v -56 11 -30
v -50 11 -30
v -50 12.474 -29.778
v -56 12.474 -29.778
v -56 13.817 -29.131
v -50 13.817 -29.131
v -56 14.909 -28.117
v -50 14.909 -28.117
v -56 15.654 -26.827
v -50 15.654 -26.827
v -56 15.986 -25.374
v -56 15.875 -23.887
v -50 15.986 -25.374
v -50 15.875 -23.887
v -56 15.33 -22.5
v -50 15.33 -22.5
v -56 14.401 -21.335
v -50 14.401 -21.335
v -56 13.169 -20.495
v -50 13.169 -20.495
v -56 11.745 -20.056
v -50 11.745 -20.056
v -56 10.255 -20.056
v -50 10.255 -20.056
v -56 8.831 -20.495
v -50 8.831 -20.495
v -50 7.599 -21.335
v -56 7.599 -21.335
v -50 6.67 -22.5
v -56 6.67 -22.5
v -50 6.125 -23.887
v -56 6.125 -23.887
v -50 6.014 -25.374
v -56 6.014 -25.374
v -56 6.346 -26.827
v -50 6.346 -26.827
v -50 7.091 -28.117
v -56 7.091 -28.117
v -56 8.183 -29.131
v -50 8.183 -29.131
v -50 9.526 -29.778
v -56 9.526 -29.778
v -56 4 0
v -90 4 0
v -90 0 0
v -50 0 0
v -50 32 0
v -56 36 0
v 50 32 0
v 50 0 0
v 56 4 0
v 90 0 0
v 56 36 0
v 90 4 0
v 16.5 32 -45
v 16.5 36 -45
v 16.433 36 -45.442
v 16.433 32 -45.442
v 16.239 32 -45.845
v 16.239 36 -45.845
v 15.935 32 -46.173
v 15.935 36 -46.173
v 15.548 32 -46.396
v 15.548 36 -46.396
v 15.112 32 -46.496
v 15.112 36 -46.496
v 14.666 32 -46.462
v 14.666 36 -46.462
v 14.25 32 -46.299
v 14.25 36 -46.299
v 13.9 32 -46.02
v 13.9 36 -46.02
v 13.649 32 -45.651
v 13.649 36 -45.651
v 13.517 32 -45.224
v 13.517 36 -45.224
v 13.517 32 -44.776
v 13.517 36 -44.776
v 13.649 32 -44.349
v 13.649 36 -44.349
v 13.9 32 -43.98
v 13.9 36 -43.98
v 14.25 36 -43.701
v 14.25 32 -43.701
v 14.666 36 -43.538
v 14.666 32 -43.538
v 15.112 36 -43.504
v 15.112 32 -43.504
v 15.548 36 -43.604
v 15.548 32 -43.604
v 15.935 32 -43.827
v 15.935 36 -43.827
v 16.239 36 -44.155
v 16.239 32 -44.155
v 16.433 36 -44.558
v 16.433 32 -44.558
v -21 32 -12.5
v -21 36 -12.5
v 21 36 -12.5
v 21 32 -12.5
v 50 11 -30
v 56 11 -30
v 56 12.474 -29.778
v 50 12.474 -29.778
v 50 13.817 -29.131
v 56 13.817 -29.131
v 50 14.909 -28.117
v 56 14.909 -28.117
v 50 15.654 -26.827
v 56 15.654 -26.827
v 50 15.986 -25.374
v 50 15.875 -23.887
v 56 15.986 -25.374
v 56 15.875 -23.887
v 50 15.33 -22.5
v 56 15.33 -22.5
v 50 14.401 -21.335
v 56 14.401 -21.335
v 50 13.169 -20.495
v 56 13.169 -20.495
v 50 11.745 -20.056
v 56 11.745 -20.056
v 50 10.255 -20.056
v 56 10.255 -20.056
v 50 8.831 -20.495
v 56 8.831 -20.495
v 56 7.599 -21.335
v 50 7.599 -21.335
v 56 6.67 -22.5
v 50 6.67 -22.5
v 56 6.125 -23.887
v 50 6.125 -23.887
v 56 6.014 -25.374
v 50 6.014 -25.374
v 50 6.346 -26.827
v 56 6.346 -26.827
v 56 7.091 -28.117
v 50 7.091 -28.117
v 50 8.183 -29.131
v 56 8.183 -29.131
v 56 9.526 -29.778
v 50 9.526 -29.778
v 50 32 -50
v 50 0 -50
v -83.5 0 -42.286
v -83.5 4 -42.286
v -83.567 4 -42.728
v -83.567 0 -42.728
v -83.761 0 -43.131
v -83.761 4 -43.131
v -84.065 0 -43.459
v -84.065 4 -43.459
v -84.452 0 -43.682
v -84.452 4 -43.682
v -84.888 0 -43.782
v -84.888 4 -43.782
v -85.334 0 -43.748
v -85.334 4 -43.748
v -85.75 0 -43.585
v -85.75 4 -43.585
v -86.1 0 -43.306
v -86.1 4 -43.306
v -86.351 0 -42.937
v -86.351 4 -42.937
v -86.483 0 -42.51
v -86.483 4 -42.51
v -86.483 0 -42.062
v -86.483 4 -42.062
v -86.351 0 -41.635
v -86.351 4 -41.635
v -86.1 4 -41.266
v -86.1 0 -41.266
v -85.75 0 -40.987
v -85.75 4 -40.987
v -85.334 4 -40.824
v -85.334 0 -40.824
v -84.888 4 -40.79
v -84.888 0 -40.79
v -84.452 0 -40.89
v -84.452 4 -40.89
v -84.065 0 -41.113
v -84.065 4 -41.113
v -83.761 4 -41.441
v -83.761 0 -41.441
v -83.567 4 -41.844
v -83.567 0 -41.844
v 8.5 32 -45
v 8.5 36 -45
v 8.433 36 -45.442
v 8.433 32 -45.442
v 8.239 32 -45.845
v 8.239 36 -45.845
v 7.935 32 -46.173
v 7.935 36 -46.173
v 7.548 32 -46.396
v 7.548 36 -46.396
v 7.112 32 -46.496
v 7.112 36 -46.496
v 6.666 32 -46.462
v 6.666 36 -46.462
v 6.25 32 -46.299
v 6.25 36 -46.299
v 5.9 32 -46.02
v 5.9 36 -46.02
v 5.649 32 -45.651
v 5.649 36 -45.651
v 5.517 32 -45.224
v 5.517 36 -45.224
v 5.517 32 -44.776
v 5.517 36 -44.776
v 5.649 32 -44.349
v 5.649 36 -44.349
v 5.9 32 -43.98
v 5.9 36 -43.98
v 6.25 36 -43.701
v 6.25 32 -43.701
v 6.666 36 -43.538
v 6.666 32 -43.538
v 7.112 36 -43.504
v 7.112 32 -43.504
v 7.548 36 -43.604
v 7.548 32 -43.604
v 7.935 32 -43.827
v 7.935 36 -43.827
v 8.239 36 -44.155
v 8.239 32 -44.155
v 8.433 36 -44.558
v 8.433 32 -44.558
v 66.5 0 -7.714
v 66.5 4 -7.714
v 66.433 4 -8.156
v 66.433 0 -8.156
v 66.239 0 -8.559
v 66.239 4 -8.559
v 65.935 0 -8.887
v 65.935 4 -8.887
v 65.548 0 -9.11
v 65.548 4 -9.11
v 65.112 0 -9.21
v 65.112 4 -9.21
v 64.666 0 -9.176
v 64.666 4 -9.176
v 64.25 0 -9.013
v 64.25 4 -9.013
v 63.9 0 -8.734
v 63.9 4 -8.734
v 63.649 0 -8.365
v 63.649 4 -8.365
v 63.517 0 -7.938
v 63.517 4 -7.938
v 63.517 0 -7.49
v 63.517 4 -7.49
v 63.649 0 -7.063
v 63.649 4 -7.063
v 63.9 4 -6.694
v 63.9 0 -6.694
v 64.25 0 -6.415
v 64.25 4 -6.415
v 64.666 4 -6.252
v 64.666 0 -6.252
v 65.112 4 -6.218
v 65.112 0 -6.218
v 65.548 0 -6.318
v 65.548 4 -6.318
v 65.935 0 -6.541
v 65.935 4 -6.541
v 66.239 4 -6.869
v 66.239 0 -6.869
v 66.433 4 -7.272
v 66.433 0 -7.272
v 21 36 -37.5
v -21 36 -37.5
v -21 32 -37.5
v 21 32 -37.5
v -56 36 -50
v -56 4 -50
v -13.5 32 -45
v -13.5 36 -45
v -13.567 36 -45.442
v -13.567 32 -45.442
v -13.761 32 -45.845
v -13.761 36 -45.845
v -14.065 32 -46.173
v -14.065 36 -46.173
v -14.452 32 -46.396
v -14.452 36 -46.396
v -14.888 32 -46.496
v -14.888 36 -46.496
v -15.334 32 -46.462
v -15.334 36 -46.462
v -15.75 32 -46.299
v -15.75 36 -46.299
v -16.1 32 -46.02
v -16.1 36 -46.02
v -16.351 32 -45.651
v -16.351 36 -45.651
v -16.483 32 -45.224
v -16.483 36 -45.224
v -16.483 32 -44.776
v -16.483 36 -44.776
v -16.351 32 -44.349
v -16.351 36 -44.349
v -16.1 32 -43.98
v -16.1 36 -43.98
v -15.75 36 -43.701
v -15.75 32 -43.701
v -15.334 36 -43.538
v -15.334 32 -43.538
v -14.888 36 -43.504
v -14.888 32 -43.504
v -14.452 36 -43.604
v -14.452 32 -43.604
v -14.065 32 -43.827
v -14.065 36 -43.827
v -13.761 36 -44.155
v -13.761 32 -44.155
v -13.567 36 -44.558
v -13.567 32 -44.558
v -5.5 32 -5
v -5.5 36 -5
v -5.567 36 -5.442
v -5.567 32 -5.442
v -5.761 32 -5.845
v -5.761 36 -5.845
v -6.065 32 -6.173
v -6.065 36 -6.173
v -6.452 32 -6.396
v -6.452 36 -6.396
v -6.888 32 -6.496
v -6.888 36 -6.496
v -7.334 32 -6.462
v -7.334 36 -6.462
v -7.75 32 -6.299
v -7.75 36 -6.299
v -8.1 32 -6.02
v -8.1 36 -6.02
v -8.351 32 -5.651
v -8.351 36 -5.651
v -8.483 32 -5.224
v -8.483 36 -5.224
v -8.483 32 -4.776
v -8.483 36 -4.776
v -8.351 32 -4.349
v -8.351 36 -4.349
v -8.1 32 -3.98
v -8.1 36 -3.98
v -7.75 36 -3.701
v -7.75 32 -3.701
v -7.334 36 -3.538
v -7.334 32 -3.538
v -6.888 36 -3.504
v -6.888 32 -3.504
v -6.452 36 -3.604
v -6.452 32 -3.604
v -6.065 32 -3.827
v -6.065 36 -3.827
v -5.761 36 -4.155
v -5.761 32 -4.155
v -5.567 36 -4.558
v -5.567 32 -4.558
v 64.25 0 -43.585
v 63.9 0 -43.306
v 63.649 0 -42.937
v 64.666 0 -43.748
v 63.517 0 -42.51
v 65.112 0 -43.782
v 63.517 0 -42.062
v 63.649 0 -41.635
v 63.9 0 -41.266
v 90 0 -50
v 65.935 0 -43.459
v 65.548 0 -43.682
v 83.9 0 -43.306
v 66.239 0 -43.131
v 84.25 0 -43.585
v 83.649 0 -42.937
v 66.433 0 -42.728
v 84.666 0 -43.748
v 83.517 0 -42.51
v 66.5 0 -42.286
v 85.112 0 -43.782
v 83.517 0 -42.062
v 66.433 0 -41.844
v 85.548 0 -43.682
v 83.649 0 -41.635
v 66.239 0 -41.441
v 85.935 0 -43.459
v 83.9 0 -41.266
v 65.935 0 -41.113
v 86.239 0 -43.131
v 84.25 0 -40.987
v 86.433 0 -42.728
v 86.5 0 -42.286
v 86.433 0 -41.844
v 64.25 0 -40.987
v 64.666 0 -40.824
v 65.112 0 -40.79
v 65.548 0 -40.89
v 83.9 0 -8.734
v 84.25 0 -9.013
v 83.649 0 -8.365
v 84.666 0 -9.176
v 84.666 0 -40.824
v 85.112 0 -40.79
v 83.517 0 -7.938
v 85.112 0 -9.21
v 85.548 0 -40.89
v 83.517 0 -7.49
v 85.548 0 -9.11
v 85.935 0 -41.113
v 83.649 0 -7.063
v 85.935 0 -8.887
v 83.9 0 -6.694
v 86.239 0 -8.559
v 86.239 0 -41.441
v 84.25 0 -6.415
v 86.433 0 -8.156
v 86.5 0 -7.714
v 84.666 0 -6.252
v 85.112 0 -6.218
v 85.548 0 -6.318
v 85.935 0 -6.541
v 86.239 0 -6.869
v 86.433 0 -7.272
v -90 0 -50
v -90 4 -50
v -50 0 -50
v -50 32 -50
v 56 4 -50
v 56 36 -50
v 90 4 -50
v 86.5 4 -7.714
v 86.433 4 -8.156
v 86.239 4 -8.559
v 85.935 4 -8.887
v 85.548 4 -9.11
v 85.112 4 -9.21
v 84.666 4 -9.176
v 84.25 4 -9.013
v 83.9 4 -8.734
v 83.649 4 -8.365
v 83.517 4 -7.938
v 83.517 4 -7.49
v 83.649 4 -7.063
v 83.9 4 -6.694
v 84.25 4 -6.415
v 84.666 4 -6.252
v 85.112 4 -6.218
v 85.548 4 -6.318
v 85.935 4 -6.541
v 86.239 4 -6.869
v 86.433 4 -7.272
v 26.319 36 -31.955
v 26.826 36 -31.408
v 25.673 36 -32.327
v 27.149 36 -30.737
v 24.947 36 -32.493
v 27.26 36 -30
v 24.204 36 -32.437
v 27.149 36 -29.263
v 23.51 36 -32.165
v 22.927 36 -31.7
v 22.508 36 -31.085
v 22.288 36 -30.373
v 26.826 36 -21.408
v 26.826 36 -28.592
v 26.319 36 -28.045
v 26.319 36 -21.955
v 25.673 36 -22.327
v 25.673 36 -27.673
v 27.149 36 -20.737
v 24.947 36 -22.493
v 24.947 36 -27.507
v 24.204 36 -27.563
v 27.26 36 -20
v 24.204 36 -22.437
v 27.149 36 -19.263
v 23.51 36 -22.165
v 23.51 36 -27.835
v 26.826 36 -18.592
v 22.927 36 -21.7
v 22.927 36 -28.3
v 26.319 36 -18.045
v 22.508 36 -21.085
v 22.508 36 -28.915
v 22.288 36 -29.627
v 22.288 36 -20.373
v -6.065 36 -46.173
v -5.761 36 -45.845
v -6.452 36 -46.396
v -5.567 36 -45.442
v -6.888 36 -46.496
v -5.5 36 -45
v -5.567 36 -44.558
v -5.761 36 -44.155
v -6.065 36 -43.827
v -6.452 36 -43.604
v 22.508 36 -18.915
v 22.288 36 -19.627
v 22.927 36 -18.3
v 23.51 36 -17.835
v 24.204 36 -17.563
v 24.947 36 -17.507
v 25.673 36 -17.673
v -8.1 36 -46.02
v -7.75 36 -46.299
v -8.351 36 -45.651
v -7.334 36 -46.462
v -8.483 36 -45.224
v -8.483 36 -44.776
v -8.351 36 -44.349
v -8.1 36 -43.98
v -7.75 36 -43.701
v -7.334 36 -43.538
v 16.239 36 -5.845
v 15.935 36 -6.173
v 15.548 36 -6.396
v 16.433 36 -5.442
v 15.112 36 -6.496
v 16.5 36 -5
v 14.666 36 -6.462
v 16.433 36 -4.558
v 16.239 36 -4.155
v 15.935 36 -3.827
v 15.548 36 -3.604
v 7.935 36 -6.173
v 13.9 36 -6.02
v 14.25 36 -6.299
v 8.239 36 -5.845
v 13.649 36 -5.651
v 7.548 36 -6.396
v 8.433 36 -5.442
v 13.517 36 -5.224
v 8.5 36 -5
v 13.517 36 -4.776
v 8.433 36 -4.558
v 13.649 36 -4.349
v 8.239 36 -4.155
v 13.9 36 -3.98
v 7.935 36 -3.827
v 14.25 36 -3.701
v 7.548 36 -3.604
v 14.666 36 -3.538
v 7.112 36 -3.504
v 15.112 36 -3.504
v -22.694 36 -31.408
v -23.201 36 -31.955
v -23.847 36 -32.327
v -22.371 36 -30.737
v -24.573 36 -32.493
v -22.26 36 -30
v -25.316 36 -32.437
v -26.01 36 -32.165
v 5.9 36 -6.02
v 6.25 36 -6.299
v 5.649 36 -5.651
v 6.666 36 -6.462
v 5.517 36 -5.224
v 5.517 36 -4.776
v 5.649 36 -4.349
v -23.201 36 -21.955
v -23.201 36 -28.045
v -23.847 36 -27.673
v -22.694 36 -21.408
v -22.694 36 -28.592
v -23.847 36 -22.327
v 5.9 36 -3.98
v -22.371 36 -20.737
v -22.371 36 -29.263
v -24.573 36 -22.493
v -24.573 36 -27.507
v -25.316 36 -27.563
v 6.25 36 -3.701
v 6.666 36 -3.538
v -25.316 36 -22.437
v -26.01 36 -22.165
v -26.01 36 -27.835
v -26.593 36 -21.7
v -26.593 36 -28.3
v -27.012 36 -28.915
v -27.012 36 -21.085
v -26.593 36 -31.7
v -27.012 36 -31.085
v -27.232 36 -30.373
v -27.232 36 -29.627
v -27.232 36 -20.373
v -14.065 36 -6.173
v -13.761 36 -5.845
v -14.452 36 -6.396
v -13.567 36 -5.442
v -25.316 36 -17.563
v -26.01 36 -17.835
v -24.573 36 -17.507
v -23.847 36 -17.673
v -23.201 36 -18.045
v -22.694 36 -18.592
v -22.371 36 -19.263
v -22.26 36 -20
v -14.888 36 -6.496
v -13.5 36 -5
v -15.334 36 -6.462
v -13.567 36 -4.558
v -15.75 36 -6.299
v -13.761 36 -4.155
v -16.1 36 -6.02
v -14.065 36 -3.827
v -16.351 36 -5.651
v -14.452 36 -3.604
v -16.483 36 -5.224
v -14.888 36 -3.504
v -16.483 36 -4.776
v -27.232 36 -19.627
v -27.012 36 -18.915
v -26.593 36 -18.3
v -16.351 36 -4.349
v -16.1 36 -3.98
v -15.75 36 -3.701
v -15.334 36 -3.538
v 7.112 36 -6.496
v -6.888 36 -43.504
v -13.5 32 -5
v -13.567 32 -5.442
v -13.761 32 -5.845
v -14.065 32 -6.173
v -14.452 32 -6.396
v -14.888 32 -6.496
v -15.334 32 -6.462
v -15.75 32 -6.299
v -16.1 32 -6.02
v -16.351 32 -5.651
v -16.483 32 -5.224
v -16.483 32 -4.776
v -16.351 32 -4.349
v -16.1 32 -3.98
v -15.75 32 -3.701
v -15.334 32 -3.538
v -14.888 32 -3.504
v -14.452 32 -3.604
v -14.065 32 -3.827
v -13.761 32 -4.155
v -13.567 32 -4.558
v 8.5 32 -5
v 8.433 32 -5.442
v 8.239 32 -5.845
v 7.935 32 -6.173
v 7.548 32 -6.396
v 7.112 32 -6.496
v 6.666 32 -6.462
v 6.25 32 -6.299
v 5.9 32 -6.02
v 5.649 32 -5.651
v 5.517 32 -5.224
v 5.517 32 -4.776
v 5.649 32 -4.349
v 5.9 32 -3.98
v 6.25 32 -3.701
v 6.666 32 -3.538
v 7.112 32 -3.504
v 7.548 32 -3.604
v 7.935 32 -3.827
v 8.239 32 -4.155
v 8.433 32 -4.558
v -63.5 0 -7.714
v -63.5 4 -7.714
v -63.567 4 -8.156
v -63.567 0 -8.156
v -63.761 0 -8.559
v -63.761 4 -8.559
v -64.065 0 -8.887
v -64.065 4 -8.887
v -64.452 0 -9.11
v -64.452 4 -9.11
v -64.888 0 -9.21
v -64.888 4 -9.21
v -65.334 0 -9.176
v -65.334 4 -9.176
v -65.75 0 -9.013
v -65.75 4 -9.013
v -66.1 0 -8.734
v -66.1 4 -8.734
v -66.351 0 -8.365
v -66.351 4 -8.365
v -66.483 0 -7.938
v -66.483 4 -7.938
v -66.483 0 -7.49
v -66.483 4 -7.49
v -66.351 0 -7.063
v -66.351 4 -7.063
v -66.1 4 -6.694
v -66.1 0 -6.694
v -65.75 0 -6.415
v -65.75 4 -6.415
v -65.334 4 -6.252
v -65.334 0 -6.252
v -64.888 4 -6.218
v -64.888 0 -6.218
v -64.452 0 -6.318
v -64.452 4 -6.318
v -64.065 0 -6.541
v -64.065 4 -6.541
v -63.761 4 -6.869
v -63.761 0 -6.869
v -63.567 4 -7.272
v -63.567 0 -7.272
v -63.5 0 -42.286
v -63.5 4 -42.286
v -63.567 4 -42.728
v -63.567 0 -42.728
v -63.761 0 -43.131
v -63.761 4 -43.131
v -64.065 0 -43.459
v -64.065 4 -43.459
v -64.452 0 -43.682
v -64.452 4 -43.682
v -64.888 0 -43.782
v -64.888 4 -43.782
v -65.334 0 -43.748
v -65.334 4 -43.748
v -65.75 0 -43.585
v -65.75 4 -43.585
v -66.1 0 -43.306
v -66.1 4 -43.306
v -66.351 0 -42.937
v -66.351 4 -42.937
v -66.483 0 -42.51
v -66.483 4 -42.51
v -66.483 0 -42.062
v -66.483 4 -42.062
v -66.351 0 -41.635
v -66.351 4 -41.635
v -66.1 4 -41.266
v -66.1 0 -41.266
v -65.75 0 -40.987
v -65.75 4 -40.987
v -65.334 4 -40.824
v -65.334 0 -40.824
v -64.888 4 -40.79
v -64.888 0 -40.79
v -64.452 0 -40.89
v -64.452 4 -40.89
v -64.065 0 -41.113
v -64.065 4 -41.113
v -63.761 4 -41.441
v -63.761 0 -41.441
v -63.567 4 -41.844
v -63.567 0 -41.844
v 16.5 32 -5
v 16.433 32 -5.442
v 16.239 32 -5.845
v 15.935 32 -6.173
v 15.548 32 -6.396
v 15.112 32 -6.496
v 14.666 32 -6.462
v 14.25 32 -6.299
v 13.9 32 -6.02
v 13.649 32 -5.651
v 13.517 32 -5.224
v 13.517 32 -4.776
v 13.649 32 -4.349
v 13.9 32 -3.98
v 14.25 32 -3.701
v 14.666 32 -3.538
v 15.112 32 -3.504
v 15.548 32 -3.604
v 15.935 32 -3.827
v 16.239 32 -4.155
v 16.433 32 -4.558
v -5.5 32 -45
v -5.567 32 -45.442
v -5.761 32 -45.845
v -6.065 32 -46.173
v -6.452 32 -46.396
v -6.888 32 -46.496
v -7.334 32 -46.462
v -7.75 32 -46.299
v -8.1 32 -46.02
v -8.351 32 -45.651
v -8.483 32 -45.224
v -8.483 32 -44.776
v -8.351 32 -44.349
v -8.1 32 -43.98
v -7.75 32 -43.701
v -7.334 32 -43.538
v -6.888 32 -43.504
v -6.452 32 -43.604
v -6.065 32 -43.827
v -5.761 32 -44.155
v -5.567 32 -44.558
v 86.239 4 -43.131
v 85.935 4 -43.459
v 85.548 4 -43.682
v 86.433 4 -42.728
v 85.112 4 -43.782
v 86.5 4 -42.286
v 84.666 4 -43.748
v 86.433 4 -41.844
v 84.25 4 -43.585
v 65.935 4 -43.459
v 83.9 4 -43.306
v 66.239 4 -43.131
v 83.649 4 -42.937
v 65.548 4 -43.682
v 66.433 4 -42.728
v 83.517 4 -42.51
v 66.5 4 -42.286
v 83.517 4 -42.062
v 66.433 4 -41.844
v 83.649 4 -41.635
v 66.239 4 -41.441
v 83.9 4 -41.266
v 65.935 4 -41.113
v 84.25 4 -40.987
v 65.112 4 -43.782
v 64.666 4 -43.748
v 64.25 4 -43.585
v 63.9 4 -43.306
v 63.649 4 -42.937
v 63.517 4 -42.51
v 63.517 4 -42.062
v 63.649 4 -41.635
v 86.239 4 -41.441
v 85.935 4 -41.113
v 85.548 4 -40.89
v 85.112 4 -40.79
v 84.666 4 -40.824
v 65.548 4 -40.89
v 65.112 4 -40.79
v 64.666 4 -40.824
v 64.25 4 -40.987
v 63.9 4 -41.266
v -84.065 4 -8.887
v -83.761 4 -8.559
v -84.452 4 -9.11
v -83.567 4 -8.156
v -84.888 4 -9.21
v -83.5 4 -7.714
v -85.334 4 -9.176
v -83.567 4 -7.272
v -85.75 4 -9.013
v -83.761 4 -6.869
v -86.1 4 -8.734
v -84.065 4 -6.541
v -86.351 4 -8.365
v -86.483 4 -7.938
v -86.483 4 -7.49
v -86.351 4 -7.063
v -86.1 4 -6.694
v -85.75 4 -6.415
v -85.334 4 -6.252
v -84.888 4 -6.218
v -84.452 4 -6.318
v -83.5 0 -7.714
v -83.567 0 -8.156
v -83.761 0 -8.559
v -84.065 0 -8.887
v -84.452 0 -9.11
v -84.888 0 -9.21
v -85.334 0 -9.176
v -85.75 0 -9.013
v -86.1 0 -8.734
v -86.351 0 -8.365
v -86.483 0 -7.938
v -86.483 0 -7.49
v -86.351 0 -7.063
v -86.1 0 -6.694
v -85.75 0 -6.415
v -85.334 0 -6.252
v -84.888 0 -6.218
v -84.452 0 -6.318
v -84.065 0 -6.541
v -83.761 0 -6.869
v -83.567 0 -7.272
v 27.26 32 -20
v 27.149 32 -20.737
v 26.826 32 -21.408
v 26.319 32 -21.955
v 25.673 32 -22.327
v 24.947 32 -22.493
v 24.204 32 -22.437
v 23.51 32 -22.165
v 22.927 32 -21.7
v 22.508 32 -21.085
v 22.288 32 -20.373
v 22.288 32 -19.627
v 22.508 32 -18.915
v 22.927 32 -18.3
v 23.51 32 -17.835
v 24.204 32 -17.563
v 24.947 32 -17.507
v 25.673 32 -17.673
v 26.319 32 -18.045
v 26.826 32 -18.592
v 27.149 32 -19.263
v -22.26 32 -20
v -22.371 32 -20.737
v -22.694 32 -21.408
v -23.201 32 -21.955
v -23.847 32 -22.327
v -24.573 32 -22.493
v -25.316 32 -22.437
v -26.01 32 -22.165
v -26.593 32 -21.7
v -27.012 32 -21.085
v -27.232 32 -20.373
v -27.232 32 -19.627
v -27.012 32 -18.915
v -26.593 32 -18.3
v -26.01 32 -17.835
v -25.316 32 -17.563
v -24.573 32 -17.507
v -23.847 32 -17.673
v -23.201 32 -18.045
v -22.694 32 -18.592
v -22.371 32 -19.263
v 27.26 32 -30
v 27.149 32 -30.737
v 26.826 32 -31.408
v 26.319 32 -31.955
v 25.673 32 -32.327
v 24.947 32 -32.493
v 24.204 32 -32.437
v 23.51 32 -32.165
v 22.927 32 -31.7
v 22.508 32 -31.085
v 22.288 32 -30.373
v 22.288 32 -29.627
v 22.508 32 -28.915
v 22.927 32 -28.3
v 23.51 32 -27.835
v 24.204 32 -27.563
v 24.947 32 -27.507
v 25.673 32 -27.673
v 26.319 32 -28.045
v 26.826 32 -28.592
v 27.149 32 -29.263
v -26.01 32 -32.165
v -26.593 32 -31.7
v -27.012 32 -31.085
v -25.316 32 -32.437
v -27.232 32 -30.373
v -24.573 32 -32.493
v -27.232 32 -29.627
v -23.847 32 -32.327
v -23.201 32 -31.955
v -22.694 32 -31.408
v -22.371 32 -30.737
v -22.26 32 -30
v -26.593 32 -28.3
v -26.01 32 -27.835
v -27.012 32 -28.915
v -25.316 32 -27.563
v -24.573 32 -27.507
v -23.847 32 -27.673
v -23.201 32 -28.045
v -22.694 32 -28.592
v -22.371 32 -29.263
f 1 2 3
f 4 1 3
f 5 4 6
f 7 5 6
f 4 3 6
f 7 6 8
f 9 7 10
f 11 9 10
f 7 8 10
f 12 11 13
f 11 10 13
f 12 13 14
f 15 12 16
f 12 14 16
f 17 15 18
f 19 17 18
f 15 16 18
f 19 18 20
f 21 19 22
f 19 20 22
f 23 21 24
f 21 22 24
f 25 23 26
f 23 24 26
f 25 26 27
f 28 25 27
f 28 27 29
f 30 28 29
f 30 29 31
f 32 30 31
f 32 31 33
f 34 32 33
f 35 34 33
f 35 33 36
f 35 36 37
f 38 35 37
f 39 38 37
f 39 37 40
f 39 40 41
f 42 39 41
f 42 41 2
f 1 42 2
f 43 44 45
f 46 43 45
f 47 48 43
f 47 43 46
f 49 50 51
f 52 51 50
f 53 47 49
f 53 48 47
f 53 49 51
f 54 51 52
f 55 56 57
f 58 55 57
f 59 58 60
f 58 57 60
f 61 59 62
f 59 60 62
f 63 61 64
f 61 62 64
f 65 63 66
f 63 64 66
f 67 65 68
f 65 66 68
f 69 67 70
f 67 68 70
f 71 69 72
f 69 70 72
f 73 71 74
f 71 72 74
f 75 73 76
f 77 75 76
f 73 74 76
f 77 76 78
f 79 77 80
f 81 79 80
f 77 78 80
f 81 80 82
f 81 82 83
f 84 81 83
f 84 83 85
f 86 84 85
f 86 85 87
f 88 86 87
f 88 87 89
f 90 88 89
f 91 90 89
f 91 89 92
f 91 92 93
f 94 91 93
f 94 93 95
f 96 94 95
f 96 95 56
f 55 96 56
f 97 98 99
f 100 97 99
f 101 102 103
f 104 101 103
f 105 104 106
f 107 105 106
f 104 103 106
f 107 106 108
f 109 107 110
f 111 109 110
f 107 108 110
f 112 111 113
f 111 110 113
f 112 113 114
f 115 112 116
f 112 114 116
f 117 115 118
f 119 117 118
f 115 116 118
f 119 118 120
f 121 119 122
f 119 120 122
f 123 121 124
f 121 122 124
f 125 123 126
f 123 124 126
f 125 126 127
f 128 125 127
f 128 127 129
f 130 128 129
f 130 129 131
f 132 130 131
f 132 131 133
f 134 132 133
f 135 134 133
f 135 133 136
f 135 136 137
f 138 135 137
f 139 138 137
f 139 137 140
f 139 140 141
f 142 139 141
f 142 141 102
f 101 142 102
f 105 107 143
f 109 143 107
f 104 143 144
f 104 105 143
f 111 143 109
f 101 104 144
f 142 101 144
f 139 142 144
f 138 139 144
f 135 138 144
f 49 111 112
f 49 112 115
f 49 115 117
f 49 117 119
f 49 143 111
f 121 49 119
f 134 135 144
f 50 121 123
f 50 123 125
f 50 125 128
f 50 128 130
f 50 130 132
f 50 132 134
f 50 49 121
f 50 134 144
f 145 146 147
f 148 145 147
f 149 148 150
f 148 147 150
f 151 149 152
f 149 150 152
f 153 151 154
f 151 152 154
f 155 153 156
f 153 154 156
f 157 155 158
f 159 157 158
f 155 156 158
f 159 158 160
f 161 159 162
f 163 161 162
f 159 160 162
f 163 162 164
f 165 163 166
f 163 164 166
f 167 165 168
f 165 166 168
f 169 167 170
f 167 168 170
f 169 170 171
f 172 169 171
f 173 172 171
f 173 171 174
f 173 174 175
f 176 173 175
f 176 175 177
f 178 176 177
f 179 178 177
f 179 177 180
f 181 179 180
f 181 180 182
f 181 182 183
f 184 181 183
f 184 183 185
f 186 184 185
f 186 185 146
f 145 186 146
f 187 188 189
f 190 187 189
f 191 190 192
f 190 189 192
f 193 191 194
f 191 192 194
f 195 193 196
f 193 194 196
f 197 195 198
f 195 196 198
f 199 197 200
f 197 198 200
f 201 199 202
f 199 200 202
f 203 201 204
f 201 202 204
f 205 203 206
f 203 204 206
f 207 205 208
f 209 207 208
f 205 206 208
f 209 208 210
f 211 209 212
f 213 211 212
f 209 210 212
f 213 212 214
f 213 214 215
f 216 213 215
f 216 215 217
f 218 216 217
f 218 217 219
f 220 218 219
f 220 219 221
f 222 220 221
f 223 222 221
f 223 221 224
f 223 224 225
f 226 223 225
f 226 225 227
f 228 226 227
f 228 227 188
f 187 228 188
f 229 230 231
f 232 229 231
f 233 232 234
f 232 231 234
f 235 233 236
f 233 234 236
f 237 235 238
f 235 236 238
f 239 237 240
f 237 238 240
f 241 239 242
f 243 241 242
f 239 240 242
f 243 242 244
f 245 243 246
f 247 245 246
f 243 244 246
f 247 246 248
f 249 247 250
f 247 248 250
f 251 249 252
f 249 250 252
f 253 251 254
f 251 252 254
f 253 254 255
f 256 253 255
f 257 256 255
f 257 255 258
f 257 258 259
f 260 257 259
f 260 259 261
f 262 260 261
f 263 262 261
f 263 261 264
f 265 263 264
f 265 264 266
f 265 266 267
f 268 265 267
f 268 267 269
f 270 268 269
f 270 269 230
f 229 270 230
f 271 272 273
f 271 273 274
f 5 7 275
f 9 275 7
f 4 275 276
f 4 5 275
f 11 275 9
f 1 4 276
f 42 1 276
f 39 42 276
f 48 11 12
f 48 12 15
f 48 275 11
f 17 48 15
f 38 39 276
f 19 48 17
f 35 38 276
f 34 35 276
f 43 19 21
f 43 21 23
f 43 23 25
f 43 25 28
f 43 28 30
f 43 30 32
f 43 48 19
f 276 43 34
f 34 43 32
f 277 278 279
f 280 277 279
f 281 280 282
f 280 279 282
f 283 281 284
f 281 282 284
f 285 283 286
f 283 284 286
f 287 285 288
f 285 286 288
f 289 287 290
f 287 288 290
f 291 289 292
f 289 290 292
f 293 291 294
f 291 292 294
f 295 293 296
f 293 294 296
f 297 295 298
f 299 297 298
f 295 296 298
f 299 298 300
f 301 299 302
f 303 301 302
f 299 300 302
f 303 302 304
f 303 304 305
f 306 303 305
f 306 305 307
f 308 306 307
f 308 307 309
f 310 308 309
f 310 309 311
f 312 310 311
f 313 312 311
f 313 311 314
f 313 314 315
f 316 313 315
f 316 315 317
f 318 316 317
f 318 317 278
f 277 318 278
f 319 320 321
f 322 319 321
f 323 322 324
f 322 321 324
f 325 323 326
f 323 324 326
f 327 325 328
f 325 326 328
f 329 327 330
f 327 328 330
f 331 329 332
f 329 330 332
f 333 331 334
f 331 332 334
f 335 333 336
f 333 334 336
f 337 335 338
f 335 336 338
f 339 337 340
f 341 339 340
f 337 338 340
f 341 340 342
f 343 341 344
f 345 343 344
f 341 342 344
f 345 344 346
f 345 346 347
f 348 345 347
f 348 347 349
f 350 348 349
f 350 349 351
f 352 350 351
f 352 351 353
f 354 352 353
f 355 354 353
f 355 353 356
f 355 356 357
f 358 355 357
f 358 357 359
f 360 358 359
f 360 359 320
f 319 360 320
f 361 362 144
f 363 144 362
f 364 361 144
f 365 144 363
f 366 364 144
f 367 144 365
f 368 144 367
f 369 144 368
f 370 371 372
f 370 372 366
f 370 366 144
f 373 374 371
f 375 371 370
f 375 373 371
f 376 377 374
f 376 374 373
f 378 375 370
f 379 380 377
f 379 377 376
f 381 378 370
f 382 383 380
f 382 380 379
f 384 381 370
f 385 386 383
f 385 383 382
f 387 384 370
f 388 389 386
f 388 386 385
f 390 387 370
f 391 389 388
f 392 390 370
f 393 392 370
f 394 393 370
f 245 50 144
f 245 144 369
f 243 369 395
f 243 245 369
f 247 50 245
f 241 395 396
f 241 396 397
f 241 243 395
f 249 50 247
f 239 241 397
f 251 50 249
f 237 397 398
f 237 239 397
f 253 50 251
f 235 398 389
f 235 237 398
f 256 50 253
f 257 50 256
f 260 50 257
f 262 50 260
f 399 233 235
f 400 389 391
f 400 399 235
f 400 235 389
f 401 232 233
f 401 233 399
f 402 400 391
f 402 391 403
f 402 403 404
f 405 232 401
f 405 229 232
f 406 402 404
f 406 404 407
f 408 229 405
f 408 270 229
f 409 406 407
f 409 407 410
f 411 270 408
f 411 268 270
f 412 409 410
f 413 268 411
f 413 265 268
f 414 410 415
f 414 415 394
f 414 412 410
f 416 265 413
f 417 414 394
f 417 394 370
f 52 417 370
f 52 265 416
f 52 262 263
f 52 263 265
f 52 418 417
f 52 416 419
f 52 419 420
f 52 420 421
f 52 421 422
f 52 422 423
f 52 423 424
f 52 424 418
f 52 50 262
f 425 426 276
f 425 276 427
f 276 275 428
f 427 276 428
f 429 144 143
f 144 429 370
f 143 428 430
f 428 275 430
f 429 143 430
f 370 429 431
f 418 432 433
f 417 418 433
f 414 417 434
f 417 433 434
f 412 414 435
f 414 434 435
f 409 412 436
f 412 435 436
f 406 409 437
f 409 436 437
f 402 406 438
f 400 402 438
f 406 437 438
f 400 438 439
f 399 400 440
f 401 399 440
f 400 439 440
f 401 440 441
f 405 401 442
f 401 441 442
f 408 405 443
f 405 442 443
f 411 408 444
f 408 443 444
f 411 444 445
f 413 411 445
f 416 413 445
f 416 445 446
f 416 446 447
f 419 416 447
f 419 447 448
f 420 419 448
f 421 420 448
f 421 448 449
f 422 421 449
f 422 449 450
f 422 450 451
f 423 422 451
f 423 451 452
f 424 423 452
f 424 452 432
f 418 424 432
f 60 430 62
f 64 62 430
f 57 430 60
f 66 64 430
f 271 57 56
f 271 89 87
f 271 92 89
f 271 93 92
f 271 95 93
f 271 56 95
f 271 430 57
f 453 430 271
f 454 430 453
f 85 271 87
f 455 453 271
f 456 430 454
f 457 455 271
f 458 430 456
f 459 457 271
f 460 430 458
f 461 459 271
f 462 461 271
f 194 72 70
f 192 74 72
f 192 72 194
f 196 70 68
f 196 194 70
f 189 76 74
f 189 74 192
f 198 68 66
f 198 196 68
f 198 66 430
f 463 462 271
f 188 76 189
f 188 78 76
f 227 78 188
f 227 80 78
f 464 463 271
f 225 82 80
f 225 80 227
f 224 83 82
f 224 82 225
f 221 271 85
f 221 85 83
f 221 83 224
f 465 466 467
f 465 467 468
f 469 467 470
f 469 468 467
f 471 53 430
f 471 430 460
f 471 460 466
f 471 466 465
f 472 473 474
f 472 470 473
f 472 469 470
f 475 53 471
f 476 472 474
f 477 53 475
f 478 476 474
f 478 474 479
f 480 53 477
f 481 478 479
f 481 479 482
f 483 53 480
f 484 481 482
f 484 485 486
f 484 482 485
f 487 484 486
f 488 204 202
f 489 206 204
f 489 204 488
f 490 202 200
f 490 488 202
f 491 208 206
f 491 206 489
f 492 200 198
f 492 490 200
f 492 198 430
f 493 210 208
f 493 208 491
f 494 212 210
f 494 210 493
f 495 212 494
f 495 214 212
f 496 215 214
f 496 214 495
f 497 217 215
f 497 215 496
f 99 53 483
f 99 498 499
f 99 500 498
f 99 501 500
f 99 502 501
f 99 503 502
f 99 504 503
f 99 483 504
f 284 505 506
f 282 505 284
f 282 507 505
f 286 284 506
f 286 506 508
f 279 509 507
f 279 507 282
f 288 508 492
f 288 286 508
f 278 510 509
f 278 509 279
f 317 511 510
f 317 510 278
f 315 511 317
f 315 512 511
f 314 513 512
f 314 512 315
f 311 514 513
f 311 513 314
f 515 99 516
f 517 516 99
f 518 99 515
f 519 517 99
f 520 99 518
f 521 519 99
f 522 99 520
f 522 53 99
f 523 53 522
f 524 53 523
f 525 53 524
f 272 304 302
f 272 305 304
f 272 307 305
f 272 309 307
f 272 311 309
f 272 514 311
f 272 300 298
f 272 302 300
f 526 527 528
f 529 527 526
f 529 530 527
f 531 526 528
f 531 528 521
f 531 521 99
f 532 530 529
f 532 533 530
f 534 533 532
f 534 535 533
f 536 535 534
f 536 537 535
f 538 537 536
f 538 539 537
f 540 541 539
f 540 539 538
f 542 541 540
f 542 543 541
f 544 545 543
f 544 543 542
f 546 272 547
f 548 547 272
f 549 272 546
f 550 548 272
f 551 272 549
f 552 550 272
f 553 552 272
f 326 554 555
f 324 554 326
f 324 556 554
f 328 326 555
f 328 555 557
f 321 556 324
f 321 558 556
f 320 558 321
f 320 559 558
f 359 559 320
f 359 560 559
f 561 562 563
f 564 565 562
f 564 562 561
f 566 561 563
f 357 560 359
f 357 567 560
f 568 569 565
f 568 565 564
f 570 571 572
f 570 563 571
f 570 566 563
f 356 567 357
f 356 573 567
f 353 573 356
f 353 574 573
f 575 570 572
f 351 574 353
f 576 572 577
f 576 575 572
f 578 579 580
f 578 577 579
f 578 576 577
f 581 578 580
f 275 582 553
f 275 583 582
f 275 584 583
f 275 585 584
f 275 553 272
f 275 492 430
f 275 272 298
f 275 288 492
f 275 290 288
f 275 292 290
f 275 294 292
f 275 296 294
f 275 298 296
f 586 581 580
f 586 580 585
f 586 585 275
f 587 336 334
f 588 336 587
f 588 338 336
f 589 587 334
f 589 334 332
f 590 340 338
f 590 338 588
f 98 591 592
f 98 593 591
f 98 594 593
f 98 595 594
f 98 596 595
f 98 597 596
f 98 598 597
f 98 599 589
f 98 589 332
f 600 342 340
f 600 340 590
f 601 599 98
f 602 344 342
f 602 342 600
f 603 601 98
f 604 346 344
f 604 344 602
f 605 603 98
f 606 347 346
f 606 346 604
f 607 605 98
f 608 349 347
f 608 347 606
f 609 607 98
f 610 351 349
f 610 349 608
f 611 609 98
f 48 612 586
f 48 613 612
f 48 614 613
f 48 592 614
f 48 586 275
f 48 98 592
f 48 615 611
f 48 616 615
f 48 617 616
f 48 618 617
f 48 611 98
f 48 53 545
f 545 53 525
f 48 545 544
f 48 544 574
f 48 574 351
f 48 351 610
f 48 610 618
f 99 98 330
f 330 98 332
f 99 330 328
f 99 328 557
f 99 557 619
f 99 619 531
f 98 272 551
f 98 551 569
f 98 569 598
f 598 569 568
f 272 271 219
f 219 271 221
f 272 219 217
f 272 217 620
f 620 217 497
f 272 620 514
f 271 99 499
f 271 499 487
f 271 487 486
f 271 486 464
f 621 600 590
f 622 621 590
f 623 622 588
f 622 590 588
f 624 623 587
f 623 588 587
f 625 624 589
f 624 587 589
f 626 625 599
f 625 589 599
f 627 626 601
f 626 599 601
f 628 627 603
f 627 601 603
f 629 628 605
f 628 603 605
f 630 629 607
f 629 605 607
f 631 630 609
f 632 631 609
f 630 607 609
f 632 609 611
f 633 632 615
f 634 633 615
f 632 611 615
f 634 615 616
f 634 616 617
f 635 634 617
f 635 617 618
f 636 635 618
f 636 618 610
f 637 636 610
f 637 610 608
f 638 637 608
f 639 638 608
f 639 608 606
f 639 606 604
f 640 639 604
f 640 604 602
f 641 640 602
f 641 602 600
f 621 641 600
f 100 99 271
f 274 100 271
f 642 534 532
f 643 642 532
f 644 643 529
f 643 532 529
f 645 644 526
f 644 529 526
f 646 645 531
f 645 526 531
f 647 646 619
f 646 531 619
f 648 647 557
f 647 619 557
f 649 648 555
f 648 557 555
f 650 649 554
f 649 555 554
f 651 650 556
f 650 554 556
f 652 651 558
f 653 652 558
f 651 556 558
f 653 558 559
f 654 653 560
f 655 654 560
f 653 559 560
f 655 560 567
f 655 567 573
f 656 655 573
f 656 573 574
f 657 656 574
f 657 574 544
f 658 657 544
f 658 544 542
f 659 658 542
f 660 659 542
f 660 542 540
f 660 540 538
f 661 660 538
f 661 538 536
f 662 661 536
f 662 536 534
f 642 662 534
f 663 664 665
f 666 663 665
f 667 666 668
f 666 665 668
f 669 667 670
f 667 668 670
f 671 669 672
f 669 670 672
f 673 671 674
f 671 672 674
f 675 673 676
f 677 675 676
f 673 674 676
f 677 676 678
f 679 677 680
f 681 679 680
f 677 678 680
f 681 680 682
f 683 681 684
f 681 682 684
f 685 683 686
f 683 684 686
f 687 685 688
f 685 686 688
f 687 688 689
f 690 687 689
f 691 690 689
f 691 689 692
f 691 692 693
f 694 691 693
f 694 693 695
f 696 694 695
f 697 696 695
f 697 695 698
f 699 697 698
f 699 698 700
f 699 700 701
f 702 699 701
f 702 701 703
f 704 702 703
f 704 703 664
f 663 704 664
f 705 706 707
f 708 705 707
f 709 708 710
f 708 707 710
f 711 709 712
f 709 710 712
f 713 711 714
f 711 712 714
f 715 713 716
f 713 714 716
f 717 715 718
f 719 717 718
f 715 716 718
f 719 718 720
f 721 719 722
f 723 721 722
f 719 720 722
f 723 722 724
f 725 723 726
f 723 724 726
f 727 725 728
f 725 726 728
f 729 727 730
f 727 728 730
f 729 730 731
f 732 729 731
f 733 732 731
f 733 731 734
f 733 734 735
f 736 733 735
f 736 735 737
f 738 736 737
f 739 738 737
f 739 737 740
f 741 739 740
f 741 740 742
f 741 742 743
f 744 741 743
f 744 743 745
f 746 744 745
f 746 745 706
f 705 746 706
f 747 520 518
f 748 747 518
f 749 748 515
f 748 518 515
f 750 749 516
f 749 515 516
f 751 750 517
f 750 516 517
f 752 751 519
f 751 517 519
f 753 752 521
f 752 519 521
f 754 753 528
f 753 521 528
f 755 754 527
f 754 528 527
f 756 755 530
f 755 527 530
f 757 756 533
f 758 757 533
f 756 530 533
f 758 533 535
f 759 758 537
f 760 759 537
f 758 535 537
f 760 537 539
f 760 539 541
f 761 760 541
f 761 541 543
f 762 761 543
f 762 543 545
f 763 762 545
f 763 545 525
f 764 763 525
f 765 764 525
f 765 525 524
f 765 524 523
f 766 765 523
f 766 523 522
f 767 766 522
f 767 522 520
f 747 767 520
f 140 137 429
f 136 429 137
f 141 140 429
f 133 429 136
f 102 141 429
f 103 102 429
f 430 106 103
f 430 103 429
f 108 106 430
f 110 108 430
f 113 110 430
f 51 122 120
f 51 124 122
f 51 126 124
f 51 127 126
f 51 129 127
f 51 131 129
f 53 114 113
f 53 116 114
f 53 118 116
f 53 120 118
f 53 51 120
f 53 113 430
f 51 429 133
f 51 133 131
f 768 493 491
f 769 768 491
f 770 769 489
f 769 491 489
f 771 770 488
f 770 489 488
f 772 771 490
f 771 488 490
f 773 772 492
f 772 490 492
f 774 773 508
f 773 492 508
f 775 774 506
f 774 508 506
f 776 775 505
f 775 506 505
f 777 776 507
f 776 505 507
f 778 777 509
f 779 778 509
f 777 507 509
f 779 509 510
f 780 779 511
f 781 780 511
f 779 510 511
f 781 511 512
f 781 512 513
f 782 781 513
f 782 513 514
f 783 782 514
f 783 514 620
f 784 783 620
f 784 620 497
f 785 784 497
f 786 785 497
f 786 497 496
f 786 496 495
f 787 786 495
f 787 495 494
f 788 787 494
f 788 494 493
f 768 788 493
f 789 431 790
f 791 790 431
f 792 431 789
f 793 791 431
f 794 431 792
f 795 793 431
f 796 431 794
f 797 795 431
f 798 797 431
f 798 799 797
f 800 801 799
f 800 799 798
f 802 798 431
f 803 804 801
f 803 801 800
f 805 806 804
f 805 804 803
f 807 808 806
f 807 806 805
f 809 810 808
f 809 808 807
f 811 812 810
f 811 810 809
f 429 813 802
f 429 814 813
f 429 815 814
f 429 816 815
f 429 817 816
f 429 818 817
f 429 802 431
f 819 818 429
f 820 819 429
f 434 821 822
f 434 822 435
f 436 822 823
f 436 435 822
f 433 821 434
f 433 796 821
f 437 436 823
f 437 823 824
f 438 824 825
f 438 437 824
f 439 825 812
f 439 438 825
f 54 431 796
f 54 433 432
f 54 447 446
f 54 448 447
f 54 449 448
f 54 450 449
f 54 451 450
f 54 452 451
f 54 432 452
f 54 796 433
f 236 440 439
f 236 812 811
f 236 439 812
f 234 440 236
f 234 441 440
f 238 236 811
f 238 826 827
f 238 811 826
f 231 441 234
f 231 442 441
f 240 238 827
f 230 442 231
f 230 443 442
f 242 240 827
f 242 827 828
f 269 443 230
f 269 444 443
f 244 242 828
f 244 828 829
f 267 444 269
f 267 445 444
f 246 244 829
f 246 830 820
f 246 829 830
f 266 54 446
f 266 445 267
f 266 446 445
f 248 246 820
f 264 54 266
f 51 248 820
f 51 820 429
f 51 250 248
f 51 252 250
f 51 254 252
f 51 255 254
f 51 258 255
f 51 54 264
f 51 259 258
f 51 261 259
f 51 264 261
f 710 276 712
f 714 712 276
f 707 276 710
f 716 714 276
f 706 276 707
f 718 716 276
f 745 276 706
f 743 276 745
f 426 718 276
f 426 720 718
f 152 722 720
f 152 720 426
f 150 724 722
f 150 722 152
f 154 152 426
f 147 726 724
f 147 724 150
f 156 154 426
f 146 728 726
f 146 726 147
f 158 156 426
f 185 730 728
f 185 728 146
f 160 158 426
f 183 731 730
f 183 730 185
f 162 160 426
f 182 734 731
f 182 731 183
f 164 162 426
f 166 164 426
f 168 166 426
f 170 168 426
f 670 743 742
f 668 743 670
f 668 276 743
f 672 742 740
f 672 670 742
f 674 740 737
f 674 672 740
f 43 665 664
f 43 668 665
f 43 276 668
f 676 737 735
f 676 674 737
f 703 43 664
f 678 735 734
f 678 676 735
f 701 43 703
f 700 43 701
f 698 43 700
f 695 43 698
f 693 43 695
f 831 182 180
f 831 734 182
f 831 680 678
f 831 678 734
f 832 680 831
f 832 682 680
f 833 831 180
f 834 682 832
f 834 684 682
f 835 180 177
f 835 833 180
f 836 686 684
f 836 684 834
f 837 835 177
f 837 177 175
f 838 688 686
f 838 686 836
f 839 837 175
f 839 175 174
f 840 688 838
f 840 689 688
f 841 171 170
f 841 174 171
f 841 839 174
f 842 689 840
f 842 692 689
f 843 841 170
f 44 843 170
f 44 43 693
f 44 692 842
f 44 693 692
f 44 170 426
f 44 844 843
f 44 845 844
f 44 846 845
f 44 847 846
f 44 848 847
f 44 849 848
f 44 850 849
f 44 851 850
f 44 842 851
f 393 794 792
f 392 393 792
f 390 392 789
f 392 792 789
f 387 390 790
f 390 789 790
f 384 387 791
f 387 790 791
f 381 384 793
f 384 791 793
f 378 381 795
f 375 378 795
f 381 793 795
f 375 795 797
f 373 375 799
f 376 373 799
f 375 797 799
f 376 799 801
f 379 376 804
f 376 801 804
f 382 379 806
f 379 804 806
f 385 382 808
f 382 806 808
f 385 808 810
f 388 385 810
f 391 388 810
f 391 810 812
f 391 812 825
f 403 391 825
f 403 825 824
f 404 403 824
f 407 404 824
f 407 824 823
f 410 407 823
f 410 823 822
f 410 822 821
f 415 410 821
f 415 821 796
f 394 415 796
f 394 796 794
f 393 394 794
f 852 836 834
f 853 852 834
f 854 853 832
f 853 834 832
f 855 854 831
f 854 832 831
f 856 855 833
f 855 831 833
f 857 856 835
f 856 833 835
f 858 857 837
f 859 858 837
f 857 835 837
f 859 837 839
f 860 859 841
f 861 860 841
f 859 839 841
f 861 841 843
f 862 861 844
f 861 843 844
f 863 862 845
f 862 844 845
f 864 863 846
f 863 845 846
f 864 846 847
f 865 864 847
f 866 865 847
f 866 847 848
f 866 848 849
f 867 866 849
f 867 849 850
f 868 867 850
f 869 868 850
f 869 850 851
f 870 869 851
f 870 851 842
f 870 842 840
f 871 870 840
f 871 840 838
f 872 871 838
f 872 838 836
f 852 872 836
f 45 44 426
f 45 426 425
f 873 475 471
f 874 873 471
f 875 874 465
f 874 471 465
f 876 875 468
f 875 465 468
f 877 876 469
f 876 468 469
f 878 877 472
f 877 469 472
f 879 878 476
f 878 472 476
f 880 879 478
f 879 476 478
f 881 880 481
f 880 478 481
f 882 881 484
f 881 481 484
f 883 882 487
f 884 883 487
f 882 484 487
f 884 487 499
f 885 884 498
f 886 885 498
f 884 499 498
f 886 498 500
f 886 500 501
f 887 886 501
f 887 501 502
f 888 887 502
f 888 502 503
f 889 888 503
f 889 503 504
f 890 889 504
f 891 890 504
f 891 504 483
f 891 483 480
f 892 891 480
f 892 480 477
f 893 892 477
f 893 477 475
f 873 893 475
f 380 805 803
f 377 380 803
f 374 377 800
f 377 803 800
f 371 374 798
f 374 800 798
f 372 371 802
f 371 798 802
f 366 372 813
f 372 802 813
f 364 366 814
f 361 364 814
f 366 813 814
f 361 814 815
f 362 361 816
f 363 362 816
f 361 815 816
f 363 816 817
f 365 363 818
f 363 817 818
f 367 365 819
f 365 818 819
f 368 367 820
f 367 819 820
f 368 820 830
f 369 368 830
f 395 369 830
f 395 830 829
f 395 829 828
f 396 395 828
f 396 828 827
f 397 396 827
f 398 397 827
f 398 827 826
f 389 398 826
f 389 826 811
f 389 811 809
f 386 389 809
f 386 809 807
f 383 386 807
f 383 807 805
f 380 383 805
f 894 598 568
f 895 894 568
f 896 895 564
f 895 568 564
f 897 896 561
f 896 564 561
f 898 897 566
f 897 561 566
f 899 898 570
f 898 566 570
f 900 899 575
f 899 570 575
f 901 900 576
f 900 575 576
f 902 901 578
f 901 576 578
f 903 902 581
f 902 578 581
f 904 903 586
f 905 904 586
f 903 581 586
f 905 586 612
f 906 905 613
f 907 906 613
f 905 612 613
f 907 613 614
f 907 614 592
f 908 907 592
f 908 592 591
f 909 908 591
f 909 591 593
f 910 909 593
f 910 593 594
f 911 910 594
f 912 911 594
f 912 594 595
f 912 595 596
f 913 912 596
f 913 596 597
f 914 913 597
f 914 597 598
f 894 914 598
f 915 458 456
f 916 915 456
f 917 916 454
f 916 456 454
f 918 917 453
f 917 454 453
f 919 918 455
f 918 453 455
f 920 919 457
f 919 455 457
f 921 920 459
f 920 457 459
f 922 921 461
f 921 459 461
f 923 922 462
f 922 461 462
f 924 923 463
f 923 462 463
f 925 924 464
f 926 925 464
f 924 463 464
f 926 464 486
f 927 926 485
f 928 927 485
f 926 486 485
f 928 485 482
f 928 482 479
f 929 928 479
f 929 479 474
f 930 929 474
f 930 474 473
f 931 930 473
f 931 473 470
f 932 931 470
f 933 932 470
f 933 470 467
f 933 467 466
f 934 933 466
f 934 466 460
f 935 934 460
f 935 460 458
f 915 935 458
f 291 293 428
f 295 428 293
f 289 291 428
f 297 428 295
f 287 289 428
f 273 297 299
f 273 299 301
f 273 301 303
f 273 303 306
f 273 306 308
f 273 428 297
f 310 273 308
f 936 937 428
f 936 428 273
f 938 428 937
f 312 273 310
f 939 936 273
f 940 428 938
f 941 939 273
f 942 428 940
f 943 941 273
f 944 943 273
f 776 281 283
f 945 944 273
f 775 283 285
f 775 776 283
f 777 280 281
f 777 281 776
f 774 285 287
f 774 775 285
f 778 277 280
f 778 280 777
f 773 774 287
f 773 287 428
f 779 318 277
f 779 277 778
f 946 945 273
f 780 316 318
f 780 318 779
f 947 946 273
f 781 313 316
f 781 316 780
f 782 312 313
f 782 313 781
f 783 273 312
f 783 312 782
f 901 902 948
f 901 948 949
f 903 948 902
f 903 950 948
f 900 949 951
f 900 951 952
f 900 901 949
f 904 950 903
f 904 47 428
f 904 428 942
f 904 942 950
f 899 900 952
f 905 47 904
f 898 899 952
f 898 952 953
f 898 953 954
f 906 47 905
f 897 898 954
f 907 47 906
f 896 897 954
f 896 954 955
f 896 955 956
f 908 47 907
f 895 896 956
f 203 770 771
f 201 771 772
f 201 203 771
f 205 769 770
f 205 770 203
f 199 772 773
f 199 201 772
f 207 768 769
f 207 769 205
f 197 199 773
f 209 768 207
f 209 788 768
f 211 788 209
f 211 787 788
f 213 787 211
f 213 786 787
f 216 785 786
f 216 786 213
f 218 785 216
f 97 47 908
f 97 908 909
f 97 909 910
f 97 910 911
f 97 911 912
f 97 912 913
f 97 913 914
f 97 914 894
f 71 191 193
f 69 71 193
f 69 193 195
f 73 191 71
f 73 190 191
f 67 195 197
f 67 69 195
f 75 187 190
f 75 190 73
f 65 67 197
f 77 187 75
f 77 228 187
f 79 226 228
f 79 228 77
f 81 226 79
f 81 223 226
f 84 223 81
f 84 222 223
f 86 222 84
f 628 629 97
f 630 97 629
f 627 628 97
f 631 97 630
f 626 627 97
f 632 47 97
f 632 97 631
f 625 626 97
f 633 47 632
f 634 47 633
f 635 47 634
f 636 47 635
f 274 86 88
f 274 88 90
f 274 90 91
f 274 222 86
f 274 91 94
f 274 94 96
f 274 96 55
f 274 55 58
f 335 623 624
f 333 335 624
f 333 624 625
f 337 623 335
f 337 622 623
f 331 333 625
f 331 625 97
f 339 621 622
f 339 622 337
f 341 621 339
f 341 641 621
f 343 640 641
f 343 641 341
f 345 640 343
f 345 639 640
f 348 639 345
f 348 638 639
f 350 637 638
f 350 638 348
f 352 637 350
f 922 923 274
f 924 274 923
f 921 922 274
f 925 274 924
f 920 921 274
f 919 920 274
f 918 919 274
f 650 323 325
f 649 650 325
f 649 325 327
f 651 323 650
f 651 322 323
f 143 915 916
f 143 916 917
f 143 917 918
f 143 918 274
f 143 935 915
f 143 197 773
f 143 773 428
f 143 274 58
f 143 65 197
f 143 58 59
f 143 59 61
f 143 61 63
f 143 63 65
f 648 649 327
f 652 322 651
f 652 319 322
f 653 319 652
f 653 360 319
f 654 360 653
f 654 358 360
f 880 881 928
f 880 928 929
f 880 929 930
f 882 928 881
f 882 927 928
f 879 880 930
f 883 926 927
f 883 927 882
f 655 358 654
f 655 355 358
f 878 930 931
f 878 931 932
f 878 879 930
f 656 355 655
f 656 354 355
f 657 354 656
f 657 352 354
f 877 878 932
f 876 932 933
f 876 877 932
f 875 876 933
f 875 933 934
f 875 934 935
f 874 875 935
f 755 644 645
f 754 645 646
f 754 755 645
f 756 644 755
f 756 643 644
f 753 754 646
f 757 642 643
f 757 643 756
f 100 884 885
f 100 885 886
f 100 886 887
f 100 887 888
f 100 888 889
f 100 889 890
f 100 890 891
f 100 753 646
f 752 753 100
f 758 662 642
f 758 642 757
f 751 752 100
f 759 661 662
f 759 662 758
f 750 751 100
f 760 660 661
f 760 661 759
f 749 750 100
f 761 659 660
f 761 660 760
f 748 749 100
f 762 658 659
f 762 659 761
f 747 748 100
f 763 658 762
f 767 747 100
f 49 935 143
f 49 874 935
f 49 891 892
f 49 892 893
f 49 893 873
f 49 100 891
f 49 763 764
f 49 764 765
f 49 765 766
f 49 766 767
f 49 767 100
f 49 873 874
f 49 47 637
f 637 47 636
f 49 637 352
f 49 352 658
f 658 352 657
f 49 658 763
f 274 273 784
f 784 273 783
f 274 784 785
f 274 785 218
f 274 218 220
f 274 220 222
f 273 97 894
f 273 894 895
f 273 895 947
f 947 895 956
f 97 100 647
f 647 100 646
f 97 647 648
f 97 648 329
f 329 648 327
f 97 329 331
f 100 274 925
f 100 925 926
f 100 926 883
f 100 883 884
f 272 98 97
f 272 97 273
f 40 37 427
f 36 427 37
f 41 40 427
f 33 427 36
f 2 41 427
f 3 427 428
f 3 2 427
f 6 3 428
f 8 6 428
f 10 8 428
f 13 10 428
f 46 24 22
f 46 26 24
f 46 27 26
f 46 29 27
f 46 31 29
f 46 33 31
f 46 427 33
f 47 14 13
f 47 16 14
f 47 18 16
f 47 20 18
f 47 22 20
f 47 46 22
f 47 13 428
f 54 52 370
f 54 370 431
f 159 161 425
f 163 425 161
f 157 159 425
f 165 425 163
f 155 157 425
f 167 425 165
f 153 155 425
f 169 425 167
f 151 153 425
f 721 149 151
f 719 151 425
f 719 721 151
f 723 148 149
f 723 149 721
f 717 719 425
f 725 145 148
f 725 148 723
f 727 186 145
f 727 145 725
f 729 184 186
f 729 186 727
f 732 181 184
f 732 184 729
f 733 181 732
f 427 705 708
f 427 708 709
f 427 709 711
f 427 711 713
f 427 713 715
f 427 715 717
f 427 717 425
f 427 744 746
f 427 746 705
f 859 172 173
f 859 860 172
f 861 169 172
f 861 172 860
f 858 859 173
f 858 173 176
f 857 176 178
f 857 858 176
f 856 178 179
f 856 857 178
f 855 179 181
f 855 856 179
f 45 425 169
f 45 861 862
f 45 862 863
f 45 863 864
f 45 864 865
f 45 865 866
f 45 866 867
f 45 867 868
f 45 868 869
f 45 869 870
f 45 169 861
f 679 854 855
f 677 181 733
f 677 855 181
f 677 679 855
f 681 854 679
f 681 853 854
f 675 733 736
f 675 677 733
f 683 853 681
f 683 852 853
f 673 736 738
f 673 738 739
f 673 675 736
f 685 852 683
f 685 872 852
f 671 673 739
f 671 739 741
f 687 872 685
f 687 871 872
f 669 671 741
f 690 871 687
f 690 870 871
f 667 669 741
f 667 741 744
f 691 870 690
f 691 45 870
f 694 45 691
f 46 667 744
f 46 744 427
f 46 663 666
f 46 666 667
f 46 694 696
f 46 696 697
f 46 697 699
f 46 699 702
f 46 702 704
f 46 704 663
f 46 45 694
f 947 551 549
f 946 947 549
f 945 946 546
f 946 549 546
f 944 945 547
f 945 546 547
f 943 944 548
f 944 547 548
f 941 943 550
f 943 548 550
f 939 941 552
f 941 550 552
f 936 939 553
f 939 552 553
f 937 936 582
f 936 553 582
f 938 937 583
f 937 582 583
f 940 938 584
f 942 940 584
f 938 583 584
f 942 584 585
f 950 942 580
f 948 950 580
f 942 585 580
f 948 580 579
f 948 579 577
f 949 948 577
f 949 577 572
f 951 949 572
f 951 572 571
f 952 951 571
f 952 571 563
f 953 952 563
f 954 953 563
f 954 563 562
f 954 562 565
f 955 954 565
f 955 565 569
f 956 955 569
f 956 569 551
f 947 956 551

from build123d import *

# Parameters (mm, degrees)
EXTRUDE_1_DEPTH     = 50
SKETCH_2_W          = 42
SKETCH_2_H          = 25
CUT_EXTRUDE_1_DEPTH = 37
SKETCH_3_R          = 2.5
CUT_EXTRUDE_2_DEPTH = 37
SKETCH_4_R          = 5
CUT_EXTRUDE_3_DEPTH = 147
SKETCH_5_R          = 1.5
CUT_EXTRUDE_4_DEPTH = 5
SKETCH_6_R          = 1.5
CUT_EXTRUDE_5_DEPTH = 37


with BuildPart() as part:
    # 草图1 → 凸台-拉伸1 (new body)
    with BuildSketch(Plane.XY):
        Polygon((90, 0), (90, 4), (56, 4), (56, 36), (-56, 36), (-56, 4), (-90, 4), (-90, 0), (-50, 0), (-50, 32), (50, 32), (50, 0), align=None)
    extrude(amount=-EXTRUDE_1_DEPTH)

    # 草图2 → 切除-拉伸1 (cut, through all)
    with BuildSketch(Plane(origin=(0, 36, 0), x_dir=(1, 0, 0), z_dir=(0, 1, 0))):
        with Locations((0, 25)):
            Rectangle(SKETCH_2_W, SKETCH_2_H)
    extrude(amount=-CUT_EXTRUDE_1_DEPTH, mode=Mode.SUBTRACT)

    # 草图3 → 切除-拉伸2 (cut, through all)
    with BuildSketch(Plane(origin=(0, 36, 0), x_dir=(1, 0, 0), z_dir=(0, 1, 0))):
        with Locations((-24.76, 30)):
            Circle(SKETCH_3_R)
        with Locations((24.76, 30)):
            Circle(SKETCH_3_R)
        with Locations((24.76, 20)):
            Circle(SKETCH_3_R)
        with Locations((-24.76, 20)):
            Circle(SKETCH_3_R)
    extrude(amount=-CUT_EXTRUDE_2_DEPTH, mode=Mode.SUBTRACT)

    # 草图4 → 切除-拉伸3 (cut, through all)
    with BuildSketch(Plane(origin=(56, 0, 0), x_dir=(0, 0, -1), z_dir=(1, 0, 0))):
        with Locations((25, 11)):
            Circle(SKETCH_4_R)
    extrude(amount=-CUT_EXTRUDE_3_DEPTH, mode=Mode.SUBTRACT)

    # 草图5 → 切除-拉伸4 (cut, through all)
    with BuildSketch(Plane(origin=(0, 4, 0), x_dir=(1, 0, 0), z_dir=(0, 1, 0))):
        with Locations((-36.607969405, 54.749619062)):
            Circle(SKETCH_5_R)
        with Locations((-65, 42.286041433)):
            Circle(SKETCH_5_R)
        with Locations((-65, 7.713958567)):
            Circle(SKETCH_5_R)
        with Locations((-36.607969405, -4.749619062)):
            Circle(SKETCH_5_R)
        with Locations((36.607969405, -4.749619062)):
            Circle(SKETCH_5_R)
        with Locations((65, 7.713958567)):
            Circle(SKETCH_5_R)
        with Locations((65, 42.286041433)):
            Circle(SKETCH_5_R)
        with Locations((36.607969405, 54.749619062)):
            Circle(SKETCH_5_R)
        with Locations((85, 7.713958567)):
            Circle(SKETCH_5_R)
        with Locations((85, 42.286041433)):
            Circle(SKETCH_5_R)
        with Locations((-85, 42.286041433)):
            Circle(SKETCH_5_R)
        with Locations((-85, 7.713958567)):
            Circle(SKETCH_5_R)
    extrude(amount=-CUT_EXTRUDE_4_DEPTH, mode=Mode.SUBTRACT)

    # 草图6 → 切除-拉伸5 (cut, through all)
    with BuildSketch(Plane(origin=(0, 36, 0), x_dir=(1, 0, 0), z_dir=(0, 1, 0))):
        with Locations((-7, 45)):
            Circle(SKETCH_6_R)
        with Locations((7, 45)):
            Circle(SKETCH_6_R)
        with Locations((-15, 45)):
            Circle(SKETCH_6_R)
        with Locations((15, 45)):
            Circle(SKETCH_6_R)
        with Locations((15, 5)):
            Circle(SKETCH_6_R)
        with Locations((7, 5)):
            Circle(SKETCH_6_R)
        with Locations((-7, 5)):
            Circle(SKETCH_6_R)
        with Locations((-15, 5)):
            Circle(SKETCH_6_R)
    extrude(amount=-CUT_EXTRUDE_5_DEPTH, mode=Mode.SUBTRACT)


solid = part.part
